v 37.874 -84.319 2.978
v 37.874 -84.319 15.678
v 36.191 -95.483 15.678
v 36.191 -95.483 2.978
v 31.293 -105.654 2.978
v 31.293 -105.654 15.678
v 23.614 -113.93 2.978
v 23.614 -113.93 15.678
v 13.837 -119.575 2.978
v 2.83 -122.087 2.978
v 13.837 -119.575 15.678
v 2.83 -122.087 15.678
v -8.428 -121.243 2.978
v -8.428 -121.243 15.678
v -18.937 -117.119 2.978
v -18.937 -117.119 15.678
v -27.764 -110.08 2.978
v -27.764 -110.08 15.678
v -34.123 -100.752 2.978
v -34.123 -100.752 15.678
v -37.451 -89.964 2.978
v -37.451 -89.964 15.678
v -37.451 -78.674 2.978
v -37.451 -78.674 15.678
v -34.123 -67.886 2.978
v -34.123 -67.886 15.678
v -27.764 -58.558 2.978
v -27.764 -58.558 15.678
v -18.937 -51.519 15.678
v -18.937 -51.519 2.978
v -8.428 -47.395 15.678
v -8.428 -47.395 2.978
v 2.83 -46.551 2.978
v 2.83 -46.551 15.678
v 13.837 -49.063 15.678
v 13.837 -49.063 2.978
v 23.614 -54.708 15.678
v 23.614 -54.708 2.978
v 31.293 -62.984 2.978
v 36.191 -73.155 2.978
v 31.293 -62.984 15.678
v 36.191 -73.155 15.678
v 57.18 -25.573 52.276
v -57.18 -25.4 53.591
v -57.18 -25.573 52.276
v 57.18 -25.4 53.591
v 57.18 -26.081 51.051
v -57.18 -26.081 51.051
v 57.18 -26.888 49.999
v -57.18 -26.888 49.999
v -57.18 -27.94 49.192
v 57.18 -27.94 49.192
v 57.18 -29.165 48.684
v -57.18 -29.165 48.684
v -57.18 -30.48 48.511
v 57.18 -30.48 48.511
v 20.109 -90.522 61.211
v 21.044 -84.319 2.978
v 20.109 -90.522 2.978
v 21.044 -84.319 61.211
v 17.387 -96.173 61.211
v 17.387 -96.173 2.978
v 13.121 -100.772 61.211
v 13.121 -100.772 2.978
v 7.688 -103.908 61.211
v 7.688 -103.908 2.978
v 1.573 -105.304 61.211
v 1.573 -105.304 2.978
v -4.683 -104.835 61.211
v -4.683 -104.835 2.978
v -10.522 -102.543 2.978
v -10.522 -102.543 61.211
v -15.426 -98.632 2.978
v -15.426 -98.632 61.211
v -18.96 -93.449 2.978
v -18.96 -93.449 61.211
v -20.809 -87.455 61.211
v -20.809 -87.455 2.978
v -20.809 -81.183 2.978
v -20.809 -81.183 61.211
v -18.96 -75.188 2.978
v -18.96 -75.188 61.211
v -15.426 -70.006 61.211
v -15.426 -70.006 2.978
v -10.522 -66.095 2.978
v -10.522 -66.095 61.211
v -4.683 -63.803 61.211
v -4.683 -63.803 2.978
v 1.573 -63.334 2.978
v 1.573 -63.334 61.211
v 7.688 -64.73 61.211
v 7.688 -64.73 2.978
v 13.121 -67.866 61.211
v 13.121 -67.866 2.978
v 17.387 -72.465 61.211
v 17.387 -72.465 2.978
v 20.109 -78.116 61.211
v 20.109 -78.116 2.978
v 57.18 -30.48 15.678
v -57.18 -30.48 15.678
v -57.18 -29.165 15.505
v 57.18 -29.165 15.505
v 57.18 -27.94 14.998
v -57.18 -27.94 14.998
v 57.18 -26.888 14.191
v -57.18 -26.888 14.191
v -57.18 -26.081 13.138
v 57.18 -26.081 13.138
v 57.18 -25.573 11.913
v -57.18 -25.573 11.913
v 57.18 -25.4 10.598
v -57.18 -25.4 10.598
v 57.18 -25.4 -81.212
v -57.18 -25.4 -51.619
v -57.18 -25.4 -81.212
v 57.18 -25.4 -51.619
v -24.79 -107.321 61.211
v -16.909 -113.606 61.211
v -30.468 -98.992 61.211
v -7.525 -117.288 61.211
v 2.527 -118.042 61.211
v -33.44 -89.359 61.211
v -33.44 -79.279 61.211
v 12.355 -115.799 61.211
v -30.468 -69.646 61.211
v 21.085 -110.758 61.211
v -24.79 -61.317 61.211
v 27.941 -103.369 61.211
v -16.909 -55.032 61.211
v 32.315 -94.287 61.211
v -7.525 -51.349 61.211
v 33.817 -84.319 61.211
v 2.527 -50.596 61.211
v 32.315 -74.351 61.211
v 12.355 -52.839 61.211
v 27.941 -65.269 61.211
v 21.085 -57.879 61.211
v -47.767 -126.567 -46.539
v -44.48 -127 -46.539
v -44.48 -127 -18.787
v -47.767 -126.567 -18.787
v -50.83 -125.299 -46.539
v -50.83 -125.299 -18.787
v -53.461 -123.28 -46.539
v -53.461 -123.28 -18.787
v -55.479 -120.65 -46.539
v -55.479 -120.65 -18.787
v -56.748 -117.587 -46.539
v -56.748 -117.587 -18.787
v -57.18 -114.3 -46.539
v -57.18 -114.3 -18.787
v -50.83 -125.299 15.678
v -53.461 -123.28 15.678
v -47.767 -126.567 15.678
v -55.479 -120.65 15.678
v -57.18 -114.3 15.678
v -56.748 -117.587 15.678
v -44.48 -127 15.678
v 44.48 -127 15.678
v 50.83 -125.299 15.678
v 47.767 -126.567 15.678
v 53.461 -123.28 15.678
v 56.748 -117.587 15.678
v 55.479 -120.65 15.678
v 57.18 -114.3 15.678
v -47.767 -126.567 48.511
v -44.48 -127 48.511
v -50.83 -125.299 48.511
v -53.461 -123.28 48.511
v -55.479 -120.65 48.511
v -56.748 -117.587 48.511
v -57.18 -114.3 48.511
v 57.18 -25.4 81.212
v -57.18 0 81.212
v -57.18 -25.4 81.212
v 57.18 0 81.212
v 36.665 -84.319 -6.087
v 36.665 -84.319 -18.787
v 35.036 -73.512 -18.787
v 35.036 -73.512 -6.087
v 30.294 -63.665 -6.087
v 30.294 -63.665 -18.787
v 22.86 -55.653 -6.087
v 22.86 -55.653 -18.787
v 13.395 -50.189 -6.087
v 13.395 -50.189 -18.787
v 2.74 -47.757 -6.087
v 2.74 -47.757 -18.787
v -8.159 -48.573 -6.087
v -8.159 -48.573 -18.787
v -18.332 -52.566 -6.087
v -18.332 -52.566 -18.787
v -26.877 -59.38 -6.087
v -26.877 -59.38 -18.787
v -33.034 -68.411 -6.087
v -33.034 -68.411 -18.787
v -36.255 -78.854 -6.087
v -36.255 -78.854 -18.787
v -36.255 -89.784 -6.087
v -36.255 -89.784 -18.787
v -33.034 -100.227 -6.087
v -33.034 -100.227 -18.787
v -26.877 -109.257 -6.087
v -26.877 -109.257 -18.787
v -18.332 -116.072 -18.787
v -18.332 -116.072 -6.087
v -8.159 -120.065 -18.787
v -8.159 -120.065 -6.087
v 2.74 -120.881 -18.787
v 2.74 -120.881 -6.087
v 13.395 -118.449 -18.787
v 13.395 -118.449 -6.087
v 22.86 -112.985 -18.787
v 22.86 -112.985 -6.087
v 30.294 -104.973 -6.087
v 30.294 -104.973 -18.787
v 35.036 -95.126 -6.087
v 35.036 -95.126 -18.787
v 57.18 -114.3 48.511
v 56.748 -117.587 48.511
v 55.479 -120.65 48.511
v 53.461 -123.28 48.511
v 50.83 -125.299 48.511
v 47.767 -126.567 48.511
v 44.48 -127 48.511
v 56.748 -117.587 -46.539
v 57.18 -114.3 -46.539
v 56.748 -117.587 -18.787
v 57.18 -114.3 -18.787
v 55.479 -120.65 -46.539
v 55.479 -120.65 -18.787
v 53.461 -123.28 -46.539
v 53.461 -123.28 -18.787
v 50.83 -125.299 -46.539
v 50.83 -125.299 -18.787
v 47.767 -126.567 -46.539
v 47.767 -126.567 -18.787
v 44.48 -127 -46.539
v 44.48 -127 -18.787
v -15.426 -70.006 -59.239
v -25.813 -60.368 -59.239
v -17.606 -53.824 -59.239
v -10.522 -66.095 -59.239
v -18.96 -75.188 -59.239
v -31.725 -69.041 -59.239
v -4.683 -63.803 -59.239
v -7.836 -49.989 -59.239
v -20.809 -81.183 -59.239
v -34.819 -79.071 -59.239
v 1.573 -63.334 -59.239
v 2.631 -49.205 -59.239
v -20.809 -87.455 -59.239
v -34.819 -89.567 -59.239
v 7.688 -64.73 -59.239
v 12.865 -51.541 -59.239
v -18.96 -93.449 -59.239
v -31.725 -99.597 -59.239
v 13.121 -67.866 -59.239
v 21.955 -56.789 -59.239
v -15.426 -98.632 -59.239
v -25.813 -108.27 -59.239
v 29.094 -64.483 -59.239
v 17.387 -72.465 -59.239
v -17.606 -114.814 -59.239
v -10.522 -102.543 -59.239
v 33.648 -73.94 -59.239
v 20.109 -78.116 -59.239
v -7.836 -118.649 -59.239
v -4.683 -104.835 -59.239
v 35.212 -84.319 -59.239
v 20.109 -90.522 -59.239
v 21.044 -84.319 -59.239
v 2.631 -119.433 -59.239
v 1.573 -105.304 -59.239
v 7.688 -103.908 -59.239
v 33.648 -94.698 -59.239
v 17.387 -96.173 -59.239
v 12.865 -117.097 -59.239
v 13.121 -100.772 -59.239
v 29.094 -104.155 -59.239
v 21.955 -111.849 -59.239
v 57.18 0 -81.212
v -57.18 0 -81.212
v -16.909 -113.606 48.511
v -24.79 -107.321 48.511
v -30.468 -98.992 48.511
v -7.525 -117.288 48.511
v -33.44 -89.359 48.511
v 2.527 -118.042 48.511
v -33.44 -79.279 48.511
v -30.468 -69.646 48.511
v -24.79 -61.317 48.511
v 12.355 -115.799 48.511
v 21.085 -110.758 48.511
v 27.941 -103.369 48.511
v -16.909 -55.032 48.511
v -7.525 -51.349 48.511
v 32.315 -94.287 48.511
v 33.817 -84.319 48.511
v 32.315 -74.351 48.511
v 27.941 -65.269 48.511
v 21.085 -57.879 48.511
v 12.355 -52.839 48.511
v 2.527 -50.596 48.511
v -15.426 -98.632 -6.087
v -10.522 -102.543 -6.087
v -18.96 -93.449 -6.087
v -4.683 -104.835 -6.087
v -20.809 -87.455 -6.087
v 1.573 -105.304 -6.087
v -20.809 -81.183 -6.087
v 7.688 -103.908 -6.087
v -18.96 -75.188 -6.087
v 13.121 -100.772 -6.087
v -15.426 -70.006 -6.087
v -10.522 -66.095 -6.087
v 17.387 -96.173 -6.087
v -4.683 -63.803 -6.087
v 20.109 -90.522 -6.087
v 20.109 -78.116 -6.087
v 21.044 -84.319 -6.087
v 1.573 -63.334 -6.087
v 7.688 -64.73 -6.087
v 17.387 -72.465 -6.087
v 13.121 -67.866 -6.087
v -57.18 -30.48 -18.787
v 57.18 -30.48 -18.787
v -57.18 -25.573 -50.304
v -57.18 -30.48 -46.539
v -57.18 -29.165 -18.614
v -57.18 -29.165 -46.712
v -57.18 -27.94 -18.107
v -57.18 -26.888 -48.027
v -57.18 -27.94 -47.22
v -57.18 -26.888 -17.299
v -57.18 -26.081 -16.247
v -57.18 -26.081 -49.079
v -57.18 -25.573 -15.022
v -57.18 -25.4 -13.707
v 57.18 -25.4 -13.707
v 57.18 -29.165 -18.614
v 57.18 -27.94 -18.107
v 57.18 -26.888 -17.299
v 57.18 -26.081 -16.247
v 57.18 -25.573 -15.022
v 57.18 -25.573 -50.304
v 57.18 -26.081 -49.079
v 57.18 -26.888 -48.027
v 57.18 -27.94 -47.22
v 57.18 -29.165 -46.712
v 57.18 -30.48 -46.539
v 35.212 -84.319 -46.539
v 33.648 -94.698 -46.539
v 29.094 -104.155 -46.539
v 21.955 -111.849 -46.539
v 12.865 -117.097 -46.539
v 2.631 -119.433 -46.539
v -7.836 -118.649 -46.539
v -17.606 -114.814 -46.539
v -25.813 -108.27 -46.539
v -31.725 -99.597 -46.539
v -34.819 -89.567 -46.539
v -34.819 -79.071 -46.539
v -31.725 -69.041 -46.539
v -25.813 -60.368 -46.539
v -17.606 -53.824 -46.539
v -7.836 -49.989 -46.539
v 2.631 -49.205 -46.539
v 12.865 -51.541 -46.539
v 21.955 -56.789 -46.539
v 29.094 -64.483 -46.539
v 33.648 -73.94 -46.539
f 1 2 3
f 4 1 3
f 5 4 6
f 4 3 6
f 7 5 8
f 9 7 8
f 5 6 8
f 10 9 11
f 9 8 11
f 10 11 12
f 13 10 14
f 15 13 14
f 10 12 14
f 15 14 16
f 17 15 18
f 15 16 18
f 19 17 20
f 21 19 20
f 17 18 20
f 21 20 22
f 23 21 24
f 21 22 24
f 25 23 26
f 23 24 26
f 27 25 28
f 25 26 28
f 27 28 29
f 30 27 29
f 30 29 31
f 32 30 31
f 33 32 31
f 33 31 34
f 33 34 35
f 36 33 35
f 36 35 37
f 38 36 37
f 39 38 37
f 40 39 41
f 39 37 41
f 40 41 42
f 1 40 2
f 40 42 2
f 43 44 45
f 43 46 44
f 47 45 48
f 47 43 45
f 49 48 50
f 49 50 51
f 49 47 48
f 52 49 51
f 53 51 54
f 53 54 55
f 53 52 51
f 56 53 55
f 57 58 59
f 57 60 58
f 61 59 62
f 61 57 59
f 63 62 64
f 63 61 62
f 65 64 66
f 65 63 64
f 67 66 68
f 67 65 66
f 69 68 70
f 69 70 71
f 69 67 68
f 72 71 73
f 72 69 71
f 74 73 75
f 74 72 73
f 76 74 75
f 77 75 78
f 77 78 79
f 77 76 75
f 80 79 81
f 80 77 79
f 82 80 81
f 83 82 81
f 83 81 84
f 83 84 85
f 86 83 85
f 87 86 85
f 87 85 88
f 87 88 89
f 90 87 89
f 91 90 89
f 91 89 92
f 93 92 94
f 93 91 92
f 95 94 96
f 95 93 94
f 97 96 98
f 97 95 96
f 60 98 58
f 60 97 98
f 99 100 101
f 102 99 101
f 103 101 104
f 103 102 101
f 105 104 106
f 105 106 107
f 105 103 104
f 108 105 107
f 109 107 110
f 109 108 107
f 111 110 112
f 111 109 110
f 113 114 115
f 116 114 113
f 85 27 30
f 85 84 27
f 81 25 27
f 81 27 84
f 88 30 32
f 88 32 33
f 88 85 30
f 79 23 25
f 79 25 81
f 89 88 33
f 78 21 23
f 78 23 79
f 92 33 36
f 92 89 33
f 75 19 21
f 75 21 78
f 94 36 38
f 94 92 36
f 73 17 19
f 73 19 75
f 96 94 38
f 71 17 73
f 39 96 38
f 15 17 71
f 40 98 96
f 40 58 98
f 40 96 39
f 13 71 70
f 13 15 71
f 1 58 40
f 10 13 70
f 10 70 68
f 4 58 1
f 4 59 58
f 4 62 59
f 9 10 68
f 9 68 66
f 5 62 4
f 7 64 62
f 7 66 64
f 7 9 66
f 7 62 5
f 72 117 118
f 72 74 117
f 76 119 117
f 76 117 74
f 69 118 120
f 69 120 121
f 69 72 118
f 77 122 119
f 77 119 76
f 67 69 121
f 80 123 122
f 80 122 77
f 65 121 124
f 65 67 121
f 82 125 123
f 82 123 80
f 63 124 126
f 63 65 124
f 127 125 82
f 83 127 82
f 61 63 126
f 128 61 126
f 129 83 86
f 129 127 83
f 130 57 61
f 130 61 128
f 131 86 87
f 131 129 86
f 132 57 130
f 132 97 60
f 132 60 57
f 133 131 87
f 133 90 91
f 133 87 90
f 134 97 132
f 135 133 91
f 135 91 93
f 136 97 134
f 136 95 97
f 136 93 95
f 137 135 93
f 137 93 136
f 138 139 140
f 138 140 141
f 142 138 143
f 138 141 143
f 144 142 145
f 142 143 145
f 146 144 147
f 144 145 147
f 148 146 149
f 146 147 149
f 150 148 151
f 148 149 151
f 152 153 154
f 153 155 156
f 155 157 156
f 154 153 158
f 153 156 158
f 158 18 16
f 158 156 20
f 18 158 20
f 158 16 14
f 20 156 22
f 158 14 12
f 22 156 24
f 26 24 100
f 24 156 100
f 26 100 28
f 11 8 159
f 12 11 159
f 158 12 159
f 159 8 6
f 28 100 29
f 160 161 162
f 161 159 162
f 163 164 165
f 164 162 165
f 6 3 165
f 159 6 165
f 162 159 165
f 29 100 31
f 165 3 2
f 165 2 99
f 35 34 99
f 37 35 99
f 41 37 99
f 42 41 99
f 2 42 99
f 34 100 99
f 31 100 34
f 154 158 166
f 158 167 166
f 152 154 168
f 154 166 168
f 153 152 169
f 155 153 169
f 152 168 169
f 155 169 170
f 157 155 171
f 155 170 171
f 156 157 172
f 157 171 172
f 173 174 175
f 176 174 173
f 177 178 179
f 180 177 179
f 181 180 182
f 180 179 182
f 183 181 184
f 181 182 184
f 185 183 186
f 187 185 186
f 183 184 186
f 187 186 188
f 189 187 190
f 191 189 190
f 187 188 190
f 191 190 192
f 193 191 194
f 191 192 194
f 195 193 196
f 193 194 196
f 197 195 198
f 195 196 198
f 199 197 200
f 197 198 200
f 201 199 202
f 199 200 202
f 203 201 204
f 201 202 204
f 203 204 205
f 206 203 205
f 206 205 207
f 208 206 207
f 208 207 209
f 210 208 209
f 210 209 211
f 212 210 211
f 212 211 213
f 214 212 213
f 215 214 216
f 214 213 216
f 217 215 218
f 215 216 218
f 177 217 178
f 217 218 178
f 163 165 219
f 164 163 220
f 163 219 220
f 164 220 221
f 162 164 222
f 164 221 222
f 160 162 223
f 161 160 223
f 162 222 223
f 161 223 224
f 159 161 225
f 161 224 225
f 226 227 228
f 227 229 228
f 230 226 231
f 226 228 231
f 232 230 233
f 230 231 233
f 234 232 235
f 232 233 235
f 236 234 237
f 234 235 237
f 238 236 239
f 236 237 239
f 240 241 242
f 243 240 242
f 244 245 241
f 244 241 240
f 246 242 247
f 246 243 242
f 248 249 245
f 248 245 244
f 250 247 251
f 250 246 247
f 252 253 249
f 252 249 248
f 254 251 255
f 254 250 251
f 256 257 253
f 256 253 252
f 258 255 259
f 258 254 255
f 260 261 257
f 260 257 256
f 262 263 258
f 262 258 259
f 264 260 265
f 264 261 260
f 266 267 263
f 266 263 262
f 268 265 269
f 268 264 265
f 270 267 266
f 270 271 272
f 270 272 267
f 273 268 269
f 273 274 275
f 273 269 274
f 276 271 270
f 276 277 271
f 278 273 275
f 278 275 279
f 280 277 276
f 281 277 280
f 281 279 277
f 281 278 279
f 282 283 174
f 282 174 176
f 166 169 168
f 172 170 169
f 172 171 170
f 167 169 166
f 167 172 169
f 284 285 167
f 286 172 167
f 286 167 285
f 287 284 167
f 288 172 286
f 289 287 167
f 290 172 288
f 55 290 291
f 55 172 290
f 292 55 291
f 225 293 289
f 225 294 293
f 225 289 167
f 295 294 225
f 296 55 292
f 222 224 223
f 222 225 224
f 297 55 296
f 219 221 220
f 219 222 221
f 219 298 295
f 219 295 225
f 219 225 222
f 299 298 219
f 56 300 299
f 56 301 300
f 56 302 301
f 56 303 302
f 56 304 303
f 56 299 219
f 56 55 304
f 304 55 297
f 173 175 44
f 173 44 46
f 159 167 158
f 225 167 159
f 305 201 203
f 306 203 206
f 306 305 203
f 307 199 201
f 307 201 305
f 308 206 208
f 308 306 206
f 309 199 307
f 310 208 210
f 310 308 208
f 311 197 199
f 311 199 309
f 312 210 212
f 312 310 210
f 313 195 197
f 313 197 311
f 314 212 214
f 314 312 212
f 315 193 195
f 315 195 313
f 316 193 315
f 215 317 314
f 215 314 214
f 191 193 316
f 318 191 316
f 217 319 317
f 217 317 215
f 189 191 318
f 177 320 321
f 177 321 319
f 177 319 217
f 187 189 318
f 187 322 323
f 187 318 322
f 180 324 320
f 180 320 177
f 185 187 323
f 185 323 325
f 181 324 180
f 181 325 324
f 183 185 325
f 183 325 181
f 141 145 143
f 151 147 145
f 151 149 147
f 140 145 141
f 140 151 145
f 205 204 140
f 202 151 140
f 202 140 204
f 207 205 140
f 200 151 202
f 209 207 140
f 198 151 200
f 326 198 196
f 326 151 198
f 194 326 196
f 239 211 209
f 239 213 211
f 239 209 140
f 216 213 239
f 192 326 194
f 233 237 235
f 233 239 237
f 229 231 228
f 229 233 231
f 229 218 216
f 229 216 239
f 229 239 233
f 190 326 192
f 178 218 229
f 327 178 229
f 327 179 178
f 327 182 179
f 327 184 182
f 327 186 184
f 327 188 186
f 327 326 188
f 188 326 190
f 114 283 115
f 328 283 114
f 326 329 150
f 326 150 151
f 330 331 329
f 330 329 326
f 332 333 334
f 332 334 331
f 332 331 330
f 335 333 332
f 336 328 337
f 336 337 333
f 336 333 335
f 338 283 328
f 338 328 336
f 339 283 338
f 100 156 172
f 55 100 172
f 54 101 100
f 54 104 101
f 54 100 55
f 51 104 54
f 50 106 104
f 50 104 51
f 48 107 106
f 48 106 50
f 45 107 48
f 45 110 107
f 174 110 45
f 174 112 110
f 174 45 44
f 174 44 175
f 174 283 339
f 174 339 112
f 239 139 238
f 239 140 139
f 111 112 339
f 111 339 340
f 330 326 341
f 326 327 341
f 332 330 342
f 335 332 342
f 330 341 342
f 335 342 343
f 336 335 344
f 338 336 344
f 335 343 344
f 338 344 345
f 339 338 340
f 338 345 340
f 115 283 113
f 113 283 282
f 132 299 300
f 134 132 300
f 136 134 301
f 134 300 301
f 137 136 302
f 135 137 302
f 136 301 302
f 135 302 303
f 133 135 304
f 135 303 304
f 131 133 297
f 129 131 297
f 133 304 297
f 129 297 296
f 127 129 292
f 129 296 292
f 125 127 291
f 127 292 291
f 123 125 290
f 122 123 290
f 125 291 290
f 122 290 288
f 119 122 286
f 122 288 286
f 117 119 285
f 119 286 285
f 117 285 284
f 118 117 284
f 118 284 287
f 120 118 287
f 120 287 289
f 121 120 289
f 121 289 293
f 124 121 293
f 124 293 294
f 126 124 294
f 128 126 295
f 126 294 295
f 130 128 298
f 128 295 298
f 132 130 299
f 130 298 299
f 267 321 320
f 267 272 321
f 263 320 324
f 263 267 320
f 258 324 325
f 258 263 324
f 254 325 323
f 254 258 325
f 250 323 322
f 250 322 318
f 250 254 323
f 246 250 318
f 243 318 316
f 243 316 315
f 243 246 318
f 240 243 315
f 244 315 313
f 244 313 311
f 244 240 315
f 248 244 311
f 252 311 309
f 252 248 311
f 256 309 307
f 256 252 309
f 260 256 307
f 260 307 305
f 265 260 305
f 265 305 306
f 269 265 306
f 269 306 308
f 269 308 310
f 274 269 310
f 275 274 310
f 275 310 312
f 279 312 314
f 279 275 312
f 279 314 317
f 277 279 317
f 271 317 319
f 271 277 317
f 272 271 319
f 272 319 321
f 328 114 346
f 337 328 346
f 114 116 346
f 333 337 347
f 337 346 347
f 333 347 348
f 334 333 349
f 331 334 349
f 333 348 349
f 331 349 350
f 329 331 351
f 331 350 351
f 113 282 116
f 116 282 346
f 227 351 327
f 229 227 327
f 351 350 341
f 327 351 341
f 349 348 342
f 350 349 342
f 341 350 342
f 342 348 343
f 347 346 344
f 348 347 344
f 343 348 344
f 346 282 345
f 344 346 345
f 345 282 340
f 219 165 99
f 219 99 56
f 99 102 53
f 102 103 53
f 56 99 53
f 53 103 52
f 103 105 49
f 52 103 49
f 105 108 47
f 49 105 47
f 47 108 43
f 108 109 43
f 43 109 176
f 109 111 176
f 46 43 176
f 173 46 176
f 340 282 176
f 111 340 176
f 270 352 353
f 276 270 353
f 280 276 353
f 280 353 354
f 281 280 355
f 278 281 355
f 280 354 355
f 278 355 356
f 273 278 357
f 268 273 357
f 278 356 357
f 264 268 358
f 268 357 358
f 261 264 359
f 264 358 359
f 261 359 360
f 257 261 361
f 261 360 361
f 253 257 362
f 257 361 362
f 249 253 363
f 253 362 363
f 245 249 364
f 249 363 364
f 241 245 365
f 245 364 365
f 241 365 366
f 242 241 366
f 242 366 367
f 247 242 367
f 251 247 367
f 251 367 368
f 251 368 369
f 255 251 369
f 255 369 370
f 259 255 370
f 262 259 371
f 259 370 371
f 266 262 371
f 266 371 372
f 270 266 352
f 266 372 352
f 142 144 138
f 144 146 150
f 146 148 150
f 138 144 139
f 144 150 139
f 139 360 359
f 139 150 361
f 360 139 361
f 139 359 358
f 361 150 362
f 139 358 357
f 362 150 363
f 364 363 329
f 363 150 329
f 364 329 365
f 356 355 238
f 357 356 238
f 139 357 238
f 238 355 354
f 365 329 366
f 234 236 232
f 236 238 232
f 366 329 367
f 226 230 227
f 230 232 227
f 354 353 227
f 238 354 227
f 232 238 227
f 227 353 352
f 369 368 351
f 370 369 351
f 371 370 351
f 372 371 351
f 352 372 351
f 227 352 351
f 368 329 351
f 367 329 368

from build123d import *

# Parameters (mm, degrees)
F0_W       = 114.3609508872
F0_H       = 162.4245643616
F1_DEPTH   = 25.4
F2_W       = 114.3609508872
F2_H       = 32.8328199685
F2_H_2     = 27.7516581118
F3_DEPTH   = 101.6
F4_R       = 21.0436715378
F3_FACE1_W = 114.3609508872
F3_FACE1_H = 101.6
F5_DEPTH   = 228.6
F6_R       = 33.8173420759
F6_R_2     = 21.0436715378
F10_DEPTH  = 12.7
F9_R       = 35.2124743409
F9_R_2     = 21.0436715378
F11_DEPTH  = 12.7
F12_R      = 5.08
F7_R       = 37.8739843542
F7_R_2     = 21.0436715378
F13_DEPTH  = 12.7
F8_R       = 36.6649491414
F8_R_2     = 21.0436715378
F14_DEPTH  = 12.7
F15_R      = 12.7


with BuildPart() as f1:
    # F0 (on Front) → F1 (new body)
    with BuildSketch(Plane.XZ):
        Rectangle(F0_W, F0_H)
    extrude(amount=F1_DEPTH)

    # F2 (on face) → F3 (join)
    with BuildSketch(Plane.XZ.offset(25.4)):
        with Locations((0, 32.0948231965)):
            Rectangle(F2_W, F2_H)
        with Locations((0, -32.6631646603)):
            Rectangle(F2_W, F2_H_2)
    extrude(amount=F3_DEPTH)

    # F4 (on face) + F3_face1 (on face) → F5 (cut)
    with BuildSketch(Plane.XY.offset(48.5112331808)):
        with Locations((0, -84.3189582229)):
            Circle(F4_R)
    with BuildSketch(Plane(origin=(0, -76.2, -46.5389937162), x_dir=(1, 0, 0), z_dir=(0, 0, -1))):
        Rectangle(F3_FACE1_W, F3_FACE1_H)
    extrude(amount=-F5_DEPTH, dir=(0, 0, 1), mode=Mode.SUBTRACT)

    # F6 (on face) → F10 (join)
    with BuildSketch(Plane.XY.offset(48.5112331808)):
        with Locations((0, -84.3189582229)):
            Circle(F6_R)
        with Locations((0, -84.3189582229)):
            Circle(F6_R_2, mode=Mode.SUBTRACT)
    extrude(amount=F10_DEPTH)

    # F9 (on face) → F11 (join)
    with BuildSketch(Plane(origin=(0, 0, -46.5389937162), x_dir=(1, 0, 0), z_dir=(0, 0, -1))):
        with Locations((0, 84.3189582229)):
            Circle(F9_R)
        with Locations((0, 84.3189582229)):
            Circle(F9_R_2, mode=Mode.SUBTRACT)
    extrude(amount=F11_DEPTH)

    # F12
    f12_edges = [f1.edges().sort_by_distance(p)[0] for p in [
        (0, -25.4, 48.511233),
        (0, -25.4, 15.678413),
        (0, -25.4, -18.787336),
        (0, -25.4, -46.538994),
    ]]
    fillet(f12_edges, radius=F12_R)

    # F7 (on face) → F13 (join)
    with BuildSketch(Plane(origin=(0, 0, 15.6784132123), x_dir=(1, 0, 0), z_dir=(0, 0, -1))):
        with Locations((0, 84.3189582229)):
            Circle(F7_R)
        with Locations((0, 84.3189582229)):
            Circle(F7_R_2, mode=Mode.SUBTRACT)
    extrude(amount=F13_DEPTH)

    # F8 (on face) → F14 (join)
    with BuildSketch(Plane.XY.offset(-18.7873356044)):
        with Locations((0, -84.3189582229)):
            Circle(F8_R)
        with Locations((0, -84.3189582229)):
            Circle(F8_R_2, mode=Mode.SUBTRACT)
    extrude(amount=F14_DEPTH)

    # F15
    f15_edges = [f1.edges().sort_by_distance(p)[0] for p in [
        (57.180475, -127, -32.663165),
        (57.180475, -127, 32.094823),
        (-57.180475, -127, -32.663165),
        (-57.180475, -127, 32.094823),
    ]]
    fillet(f15_edges, radius=F15_R)


solid = f1.part
